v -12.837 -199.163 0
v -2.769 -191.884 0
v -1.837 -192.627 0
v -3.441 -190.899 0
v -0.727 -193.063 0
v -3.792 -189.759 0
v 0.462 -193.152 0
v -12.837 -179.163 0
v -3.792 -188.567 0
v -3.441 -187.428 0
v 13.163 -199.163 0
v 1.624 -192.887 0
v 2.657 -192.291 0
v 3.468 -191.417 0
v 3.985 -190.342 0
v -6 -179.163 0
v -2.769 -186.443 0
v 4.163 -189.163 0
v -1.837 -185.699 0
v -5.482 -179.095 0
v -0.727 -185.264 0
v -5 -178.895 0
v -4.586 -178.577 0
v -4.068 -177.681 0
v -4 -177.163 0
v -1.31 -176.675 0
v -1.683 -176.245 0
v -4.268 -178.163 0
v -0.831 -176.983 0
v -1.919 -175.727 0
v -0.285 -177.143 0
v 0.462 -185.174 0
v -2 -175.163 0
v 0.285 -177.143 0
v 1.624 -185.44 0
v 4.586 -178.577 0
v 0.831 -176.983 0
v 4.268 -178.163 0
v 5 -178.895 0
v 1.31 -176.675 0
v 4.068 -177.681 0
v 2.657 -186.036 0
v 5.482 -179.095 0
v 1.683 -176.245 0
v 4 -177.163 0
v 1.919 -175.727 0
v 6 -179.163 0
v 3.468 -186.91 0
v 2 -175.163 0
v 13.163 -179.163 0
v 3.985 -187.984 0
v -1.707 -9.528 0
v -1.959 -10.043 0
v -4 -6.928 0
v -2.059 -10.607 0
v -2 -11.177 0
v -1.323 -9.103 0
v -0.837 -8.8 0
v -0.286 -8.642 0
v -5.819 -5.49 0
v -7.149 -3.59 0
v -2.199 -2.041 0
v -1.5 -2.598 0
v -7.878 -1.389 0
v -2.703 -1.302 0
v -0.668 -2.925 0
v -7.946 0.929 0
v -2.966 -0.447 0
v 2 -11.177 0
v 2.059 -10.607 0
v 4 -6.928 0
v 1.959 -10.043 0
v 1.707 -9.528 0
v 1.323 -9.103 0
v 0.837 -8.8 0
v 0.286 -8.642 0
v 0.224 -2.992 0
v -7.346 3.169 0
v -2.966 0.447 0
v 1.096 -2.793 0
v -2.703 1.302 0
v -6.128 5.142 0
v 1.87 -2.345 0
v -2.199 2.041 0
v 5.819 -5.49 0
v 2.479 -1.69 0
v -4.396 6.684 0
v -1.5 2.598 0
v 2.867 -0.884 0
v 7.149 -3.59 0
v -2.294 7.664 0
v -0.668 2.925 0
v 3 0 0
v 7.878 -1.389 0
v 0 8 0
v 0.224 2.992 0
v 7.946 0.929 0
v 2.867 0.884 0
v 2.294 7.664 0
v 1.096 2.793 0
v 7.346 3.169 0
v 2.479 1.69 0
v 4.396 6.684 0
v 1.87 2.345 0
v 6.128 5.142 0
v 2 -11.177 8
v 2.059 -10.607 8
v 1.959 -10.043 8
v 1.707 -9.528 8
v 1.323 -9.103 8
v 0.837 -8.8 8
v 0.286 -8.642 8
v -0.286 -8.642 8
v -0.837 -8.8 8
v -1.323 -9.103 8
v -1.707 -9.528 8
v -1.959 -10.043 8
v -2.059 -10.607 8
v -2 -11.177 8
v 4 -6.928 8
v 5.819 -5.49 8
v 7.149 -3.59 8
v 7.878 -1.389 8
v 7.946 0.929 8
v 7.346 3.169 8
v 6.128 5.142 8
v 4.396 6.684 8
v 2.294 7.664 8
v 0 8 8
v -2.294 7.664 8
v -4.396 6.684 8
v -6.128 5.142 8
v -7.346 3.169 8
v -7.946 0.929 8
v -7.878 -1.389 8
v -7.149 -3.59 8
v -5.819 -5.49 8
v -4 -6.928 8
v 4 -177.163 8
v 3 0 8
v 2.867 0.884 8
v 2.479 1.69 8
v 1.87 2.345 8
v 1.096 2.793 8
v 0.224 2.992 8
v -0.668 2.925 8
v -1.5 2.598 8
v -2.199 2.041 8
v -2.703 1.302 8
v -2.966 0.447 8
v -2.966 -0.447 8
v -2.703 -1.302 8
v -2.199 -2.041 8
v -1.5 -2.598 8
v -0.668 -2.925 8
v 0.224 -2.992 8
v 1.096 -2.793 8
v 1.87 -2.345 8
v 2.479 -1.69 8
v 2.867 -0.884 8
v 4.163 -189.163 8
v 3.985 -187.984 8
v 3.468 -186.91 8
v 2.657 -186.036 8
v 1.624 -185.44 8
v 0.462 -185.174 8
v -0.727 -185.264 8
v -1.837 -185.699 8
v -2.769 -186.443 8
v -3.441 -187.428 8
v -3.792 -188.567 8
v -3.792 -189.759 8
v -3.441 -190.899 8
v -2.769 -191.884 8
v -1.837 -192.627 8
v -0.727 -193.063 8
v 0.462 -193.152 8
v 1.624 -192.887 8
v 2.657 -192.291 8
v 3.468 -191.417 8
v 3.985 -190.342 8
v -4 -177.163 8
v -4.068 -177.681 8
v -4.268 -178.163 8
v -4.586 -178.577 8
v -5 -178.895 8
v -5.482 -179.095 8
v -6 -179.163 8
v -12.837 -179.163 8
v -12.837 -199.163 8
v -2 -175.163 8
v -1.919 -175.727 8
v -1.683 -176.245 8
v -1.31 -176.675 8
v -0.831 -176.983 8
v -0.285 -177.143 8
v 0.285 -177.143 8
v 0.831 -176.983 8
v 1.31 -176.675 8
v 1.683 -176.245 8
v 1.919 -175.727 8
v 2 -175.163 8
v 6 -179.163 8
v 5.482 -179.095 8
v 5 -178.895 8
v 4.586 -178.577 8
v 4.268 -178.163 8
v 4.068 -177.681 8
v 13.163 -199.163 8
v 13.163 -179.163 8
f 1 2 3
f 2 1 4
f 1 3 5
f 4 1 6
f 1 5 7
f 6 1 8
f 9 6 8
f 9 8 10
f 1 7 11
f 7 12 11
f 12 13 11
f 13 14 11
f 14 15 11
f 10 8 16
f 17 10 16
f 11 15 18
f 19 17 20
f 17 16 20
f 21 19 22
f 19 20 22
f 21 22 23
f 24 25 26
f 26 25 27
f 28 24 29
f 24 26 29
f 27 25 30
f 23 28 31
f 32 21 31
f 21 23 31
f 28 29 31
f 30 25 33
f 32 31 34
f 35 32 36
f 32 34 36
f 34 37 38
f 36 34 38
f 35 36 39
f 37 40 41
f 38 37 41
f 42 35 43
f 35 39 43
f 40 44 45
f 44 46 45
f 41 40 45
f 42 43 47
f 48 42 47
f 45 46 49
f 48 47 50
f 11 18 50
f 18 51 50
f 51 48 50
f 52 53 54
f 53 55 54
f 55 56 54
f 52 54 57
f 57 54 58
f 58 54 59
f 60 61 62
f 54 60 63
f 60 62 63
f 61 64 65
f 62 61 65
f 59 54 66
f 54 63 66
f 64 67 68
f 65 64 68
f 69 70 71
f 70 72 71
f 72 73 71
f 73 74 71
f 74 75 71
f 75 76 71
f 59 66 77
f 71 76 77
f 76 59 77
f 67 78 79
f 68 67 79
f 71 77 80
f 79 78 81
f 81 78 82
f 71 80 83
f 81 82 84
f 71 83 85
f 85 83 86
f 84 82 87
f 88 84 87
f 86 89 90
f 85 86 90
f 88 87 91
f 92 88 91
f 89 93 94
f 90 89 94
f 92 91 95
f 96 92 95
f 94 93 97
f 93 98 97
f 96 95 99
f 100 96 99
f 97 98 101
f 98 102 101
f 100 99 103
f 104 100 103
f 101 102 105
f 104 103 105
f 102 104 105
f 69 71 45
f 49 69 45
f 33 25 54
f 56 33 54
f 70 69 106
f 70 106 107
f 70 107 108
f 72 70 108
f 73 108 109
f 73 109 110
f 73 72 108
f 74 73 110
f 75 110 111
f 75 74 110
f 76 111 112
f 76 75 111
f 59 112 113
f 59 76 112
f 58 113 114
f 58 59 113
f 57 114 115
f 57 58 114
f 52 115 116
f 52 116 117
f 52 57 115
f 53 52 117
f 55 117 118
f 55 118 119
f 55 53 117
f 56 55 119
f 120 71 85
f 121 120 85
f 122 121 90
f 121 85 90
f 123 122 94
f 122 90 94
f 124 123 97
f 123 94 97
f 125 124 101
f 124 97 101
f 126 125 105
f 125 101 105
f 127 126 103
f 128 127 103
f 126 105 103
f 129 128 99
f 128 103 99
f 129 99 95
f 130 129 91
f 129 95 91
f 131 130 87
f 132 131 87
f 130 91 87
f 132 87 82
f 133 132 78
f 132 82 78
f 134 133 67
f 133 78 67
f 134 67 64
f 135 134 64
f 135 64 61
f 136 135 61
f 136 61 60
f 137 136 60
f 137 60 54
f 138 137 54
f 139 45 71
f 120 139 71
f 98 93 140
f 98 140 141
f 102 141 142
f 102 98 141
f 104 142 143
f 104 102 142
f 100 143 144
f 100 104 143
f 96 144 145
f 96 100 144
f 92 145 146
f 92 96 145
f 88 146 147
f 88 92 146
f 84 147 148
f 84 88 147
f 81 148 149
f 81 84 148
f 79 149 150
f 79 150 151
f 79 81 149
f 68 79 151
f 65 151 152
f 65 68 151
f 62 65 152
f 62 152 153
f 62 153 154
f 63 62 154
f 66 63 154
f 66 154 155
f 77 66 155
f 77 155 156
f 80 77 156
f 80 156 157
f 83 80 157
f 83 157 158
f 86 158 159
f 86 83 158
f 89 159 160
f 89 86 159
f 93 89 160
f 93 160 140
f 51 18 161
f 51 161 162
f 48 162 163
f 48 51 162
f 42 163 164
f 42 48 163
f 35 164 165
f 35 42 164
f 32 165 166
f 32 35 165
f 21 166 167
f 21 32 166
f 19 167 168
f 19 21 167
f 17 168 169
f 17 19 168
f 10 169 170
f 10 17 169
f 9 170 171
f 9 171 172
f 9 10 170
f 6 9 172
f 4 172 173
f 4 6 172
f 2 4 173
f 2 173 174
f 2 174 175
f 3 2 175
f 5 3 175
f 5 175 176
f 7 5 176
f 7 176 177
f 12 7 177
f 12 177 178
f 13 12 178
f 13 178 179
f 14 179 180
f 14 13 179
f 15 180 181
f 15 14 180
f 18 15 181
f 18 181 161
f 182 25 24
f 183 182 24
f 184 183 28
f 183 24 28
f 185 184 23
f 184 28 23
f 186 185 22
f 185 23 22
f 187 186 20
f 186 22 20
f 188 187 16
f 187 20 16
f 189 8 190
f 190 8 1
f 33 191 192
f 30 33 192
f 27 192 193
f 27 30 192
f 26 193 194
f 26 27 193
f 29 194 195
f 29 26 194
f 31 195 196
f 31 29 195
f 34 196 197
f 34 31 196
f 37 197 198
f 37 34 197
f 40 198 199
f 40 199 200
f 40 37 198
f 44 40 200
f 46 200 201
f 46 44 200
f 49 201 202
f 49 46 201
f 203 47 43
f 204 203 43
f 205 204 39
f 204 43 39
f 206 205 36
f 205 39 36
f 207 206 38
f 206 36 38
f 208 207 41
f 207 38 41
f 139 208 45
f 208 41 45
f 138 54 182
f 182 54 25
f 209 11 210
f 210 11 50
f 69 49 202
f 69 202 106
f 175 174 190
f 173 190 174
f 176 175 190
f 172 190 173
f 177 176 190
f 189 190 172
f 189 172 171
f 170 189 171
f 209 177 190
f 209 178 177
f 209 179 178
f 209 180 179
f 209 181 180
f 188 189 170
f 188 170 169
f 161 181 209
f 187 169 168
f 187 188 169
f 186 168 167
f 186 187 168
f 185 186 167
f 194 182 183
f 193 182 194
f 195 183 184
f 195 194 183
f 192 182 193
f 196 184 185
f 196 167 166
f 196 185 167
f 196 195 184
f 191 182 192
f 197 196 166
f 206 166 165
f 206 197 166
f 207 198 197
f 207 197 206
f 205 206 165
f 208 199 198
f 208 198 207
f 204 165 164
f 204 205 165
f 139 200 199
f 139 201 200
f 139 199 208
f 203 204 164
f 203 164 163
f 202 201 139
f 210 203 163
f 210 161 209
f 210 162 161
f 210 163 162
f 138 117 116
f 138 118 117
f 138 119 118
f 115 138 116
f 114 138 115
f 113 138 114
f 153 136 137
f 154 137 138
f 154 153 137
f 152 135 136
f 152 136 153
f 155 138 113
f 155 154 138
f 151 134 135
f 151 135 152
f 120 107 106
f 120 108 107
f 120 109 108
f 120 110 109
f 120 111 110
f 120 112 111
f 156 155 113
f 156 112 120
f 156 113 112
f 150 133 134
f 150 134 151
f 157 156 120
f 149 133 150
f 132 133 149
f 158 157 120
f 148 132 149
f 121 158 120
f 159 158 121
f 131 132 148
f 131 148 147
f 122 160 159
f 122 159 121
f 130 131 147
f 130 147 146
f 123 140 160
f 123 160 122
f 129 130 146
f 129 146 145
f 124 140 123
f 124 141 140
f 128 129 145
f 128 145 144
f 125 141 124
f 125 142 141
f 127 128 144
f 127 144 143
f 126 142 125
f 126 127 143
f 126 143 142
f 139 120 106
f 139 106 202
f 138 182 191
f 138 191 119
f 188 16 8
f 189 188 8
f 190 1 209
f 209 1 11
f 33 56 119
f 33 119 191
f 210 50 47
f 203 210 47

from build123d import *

# Parameters (mm, degrees)
SKETCH1_R           = 5
SKETCH1_R_2         = 6
SKETCH1_R_3         = 3
SKETCH1_R_4         = 4
BOSS_EXTRUDE1_DEPTH = 8


with BuildPart() as part:
    # Sketch1 → Boss-Extrude1 (new body)
    # profile 1 of 3: a face of its own
    with BuildSketch(Plane.XY):
        with BuildLine():
            Line((13.16300623, -179.16324922), (6, -179.16324922))
            ThreePointArc((6, -179.16324922), (4.585786438, -178.577462783), (4, -177.16324922))
            Line((4, -177.16324922), (4, -6.92820323))
            ThreePointArc((4, -6.92820323), (0, 8), (-4, -6.92820323))
            Line((-4, -6.92820323), (-4, -177.16324922))
            ThreePointArc((-4, -177.16324922), (-4.585786438, -178.577462783), (-6, -179.16324922))
            Line((-6, -179.16324922), (-12.83699377, -179.16324922))
            Line((-12.83699377, -179.16324922), (-12.83699377, -199.16324922))
            Line((-12.83699377, -199.16324922), (13.16300623, -199.16324922))
            Line((13.16300623, -199.16324922), (13.16300623, -179.16324922))
        make_face()
        Circle(SKETCH1_R, mode=Mode.SUBTRACT)
        with Locations((0.16300623, -189.16324922)):
            Circle(SKETCH1_R_2, mode=Mode.SUBTRACT)
        with BuildLine():
            ThreePointArc((-2, -175.16324922), (0, -177.16324922), (2, -175.16324922))
            Line((2, -175.16324922), (2, -11.176871049))
            ThreePointArc((2, -11.176871049), (0, -8.621835967), (-2, -11.176871049))
            Line((-2, -11.176871049), (-2, -175.16324922))
        make_face(mode=Mode.SUBTRACT)
    # profile 2 of 3: a face of its own
    with BuildSketch(Plane.XY):
        Circle(SKETCH1_R)
        Circle(SKETCH1_R_3, mode=Mode.SUBTRACT)
    # profile 3 of 3: a face of its own
    with BuildSketch(Plane.XY):
        with Locations((0.16300623, -189.16324922)):
            Circle(SKETCH1_R_2)
        with Locations((0.16300623, -189.16324922)):
            Circle(SKETCH1_R_4, mode=Mode.SUBTRACT)
    extrude(amount=BOSS_EXTRUDE1_DEPTH)


solid = part.part
